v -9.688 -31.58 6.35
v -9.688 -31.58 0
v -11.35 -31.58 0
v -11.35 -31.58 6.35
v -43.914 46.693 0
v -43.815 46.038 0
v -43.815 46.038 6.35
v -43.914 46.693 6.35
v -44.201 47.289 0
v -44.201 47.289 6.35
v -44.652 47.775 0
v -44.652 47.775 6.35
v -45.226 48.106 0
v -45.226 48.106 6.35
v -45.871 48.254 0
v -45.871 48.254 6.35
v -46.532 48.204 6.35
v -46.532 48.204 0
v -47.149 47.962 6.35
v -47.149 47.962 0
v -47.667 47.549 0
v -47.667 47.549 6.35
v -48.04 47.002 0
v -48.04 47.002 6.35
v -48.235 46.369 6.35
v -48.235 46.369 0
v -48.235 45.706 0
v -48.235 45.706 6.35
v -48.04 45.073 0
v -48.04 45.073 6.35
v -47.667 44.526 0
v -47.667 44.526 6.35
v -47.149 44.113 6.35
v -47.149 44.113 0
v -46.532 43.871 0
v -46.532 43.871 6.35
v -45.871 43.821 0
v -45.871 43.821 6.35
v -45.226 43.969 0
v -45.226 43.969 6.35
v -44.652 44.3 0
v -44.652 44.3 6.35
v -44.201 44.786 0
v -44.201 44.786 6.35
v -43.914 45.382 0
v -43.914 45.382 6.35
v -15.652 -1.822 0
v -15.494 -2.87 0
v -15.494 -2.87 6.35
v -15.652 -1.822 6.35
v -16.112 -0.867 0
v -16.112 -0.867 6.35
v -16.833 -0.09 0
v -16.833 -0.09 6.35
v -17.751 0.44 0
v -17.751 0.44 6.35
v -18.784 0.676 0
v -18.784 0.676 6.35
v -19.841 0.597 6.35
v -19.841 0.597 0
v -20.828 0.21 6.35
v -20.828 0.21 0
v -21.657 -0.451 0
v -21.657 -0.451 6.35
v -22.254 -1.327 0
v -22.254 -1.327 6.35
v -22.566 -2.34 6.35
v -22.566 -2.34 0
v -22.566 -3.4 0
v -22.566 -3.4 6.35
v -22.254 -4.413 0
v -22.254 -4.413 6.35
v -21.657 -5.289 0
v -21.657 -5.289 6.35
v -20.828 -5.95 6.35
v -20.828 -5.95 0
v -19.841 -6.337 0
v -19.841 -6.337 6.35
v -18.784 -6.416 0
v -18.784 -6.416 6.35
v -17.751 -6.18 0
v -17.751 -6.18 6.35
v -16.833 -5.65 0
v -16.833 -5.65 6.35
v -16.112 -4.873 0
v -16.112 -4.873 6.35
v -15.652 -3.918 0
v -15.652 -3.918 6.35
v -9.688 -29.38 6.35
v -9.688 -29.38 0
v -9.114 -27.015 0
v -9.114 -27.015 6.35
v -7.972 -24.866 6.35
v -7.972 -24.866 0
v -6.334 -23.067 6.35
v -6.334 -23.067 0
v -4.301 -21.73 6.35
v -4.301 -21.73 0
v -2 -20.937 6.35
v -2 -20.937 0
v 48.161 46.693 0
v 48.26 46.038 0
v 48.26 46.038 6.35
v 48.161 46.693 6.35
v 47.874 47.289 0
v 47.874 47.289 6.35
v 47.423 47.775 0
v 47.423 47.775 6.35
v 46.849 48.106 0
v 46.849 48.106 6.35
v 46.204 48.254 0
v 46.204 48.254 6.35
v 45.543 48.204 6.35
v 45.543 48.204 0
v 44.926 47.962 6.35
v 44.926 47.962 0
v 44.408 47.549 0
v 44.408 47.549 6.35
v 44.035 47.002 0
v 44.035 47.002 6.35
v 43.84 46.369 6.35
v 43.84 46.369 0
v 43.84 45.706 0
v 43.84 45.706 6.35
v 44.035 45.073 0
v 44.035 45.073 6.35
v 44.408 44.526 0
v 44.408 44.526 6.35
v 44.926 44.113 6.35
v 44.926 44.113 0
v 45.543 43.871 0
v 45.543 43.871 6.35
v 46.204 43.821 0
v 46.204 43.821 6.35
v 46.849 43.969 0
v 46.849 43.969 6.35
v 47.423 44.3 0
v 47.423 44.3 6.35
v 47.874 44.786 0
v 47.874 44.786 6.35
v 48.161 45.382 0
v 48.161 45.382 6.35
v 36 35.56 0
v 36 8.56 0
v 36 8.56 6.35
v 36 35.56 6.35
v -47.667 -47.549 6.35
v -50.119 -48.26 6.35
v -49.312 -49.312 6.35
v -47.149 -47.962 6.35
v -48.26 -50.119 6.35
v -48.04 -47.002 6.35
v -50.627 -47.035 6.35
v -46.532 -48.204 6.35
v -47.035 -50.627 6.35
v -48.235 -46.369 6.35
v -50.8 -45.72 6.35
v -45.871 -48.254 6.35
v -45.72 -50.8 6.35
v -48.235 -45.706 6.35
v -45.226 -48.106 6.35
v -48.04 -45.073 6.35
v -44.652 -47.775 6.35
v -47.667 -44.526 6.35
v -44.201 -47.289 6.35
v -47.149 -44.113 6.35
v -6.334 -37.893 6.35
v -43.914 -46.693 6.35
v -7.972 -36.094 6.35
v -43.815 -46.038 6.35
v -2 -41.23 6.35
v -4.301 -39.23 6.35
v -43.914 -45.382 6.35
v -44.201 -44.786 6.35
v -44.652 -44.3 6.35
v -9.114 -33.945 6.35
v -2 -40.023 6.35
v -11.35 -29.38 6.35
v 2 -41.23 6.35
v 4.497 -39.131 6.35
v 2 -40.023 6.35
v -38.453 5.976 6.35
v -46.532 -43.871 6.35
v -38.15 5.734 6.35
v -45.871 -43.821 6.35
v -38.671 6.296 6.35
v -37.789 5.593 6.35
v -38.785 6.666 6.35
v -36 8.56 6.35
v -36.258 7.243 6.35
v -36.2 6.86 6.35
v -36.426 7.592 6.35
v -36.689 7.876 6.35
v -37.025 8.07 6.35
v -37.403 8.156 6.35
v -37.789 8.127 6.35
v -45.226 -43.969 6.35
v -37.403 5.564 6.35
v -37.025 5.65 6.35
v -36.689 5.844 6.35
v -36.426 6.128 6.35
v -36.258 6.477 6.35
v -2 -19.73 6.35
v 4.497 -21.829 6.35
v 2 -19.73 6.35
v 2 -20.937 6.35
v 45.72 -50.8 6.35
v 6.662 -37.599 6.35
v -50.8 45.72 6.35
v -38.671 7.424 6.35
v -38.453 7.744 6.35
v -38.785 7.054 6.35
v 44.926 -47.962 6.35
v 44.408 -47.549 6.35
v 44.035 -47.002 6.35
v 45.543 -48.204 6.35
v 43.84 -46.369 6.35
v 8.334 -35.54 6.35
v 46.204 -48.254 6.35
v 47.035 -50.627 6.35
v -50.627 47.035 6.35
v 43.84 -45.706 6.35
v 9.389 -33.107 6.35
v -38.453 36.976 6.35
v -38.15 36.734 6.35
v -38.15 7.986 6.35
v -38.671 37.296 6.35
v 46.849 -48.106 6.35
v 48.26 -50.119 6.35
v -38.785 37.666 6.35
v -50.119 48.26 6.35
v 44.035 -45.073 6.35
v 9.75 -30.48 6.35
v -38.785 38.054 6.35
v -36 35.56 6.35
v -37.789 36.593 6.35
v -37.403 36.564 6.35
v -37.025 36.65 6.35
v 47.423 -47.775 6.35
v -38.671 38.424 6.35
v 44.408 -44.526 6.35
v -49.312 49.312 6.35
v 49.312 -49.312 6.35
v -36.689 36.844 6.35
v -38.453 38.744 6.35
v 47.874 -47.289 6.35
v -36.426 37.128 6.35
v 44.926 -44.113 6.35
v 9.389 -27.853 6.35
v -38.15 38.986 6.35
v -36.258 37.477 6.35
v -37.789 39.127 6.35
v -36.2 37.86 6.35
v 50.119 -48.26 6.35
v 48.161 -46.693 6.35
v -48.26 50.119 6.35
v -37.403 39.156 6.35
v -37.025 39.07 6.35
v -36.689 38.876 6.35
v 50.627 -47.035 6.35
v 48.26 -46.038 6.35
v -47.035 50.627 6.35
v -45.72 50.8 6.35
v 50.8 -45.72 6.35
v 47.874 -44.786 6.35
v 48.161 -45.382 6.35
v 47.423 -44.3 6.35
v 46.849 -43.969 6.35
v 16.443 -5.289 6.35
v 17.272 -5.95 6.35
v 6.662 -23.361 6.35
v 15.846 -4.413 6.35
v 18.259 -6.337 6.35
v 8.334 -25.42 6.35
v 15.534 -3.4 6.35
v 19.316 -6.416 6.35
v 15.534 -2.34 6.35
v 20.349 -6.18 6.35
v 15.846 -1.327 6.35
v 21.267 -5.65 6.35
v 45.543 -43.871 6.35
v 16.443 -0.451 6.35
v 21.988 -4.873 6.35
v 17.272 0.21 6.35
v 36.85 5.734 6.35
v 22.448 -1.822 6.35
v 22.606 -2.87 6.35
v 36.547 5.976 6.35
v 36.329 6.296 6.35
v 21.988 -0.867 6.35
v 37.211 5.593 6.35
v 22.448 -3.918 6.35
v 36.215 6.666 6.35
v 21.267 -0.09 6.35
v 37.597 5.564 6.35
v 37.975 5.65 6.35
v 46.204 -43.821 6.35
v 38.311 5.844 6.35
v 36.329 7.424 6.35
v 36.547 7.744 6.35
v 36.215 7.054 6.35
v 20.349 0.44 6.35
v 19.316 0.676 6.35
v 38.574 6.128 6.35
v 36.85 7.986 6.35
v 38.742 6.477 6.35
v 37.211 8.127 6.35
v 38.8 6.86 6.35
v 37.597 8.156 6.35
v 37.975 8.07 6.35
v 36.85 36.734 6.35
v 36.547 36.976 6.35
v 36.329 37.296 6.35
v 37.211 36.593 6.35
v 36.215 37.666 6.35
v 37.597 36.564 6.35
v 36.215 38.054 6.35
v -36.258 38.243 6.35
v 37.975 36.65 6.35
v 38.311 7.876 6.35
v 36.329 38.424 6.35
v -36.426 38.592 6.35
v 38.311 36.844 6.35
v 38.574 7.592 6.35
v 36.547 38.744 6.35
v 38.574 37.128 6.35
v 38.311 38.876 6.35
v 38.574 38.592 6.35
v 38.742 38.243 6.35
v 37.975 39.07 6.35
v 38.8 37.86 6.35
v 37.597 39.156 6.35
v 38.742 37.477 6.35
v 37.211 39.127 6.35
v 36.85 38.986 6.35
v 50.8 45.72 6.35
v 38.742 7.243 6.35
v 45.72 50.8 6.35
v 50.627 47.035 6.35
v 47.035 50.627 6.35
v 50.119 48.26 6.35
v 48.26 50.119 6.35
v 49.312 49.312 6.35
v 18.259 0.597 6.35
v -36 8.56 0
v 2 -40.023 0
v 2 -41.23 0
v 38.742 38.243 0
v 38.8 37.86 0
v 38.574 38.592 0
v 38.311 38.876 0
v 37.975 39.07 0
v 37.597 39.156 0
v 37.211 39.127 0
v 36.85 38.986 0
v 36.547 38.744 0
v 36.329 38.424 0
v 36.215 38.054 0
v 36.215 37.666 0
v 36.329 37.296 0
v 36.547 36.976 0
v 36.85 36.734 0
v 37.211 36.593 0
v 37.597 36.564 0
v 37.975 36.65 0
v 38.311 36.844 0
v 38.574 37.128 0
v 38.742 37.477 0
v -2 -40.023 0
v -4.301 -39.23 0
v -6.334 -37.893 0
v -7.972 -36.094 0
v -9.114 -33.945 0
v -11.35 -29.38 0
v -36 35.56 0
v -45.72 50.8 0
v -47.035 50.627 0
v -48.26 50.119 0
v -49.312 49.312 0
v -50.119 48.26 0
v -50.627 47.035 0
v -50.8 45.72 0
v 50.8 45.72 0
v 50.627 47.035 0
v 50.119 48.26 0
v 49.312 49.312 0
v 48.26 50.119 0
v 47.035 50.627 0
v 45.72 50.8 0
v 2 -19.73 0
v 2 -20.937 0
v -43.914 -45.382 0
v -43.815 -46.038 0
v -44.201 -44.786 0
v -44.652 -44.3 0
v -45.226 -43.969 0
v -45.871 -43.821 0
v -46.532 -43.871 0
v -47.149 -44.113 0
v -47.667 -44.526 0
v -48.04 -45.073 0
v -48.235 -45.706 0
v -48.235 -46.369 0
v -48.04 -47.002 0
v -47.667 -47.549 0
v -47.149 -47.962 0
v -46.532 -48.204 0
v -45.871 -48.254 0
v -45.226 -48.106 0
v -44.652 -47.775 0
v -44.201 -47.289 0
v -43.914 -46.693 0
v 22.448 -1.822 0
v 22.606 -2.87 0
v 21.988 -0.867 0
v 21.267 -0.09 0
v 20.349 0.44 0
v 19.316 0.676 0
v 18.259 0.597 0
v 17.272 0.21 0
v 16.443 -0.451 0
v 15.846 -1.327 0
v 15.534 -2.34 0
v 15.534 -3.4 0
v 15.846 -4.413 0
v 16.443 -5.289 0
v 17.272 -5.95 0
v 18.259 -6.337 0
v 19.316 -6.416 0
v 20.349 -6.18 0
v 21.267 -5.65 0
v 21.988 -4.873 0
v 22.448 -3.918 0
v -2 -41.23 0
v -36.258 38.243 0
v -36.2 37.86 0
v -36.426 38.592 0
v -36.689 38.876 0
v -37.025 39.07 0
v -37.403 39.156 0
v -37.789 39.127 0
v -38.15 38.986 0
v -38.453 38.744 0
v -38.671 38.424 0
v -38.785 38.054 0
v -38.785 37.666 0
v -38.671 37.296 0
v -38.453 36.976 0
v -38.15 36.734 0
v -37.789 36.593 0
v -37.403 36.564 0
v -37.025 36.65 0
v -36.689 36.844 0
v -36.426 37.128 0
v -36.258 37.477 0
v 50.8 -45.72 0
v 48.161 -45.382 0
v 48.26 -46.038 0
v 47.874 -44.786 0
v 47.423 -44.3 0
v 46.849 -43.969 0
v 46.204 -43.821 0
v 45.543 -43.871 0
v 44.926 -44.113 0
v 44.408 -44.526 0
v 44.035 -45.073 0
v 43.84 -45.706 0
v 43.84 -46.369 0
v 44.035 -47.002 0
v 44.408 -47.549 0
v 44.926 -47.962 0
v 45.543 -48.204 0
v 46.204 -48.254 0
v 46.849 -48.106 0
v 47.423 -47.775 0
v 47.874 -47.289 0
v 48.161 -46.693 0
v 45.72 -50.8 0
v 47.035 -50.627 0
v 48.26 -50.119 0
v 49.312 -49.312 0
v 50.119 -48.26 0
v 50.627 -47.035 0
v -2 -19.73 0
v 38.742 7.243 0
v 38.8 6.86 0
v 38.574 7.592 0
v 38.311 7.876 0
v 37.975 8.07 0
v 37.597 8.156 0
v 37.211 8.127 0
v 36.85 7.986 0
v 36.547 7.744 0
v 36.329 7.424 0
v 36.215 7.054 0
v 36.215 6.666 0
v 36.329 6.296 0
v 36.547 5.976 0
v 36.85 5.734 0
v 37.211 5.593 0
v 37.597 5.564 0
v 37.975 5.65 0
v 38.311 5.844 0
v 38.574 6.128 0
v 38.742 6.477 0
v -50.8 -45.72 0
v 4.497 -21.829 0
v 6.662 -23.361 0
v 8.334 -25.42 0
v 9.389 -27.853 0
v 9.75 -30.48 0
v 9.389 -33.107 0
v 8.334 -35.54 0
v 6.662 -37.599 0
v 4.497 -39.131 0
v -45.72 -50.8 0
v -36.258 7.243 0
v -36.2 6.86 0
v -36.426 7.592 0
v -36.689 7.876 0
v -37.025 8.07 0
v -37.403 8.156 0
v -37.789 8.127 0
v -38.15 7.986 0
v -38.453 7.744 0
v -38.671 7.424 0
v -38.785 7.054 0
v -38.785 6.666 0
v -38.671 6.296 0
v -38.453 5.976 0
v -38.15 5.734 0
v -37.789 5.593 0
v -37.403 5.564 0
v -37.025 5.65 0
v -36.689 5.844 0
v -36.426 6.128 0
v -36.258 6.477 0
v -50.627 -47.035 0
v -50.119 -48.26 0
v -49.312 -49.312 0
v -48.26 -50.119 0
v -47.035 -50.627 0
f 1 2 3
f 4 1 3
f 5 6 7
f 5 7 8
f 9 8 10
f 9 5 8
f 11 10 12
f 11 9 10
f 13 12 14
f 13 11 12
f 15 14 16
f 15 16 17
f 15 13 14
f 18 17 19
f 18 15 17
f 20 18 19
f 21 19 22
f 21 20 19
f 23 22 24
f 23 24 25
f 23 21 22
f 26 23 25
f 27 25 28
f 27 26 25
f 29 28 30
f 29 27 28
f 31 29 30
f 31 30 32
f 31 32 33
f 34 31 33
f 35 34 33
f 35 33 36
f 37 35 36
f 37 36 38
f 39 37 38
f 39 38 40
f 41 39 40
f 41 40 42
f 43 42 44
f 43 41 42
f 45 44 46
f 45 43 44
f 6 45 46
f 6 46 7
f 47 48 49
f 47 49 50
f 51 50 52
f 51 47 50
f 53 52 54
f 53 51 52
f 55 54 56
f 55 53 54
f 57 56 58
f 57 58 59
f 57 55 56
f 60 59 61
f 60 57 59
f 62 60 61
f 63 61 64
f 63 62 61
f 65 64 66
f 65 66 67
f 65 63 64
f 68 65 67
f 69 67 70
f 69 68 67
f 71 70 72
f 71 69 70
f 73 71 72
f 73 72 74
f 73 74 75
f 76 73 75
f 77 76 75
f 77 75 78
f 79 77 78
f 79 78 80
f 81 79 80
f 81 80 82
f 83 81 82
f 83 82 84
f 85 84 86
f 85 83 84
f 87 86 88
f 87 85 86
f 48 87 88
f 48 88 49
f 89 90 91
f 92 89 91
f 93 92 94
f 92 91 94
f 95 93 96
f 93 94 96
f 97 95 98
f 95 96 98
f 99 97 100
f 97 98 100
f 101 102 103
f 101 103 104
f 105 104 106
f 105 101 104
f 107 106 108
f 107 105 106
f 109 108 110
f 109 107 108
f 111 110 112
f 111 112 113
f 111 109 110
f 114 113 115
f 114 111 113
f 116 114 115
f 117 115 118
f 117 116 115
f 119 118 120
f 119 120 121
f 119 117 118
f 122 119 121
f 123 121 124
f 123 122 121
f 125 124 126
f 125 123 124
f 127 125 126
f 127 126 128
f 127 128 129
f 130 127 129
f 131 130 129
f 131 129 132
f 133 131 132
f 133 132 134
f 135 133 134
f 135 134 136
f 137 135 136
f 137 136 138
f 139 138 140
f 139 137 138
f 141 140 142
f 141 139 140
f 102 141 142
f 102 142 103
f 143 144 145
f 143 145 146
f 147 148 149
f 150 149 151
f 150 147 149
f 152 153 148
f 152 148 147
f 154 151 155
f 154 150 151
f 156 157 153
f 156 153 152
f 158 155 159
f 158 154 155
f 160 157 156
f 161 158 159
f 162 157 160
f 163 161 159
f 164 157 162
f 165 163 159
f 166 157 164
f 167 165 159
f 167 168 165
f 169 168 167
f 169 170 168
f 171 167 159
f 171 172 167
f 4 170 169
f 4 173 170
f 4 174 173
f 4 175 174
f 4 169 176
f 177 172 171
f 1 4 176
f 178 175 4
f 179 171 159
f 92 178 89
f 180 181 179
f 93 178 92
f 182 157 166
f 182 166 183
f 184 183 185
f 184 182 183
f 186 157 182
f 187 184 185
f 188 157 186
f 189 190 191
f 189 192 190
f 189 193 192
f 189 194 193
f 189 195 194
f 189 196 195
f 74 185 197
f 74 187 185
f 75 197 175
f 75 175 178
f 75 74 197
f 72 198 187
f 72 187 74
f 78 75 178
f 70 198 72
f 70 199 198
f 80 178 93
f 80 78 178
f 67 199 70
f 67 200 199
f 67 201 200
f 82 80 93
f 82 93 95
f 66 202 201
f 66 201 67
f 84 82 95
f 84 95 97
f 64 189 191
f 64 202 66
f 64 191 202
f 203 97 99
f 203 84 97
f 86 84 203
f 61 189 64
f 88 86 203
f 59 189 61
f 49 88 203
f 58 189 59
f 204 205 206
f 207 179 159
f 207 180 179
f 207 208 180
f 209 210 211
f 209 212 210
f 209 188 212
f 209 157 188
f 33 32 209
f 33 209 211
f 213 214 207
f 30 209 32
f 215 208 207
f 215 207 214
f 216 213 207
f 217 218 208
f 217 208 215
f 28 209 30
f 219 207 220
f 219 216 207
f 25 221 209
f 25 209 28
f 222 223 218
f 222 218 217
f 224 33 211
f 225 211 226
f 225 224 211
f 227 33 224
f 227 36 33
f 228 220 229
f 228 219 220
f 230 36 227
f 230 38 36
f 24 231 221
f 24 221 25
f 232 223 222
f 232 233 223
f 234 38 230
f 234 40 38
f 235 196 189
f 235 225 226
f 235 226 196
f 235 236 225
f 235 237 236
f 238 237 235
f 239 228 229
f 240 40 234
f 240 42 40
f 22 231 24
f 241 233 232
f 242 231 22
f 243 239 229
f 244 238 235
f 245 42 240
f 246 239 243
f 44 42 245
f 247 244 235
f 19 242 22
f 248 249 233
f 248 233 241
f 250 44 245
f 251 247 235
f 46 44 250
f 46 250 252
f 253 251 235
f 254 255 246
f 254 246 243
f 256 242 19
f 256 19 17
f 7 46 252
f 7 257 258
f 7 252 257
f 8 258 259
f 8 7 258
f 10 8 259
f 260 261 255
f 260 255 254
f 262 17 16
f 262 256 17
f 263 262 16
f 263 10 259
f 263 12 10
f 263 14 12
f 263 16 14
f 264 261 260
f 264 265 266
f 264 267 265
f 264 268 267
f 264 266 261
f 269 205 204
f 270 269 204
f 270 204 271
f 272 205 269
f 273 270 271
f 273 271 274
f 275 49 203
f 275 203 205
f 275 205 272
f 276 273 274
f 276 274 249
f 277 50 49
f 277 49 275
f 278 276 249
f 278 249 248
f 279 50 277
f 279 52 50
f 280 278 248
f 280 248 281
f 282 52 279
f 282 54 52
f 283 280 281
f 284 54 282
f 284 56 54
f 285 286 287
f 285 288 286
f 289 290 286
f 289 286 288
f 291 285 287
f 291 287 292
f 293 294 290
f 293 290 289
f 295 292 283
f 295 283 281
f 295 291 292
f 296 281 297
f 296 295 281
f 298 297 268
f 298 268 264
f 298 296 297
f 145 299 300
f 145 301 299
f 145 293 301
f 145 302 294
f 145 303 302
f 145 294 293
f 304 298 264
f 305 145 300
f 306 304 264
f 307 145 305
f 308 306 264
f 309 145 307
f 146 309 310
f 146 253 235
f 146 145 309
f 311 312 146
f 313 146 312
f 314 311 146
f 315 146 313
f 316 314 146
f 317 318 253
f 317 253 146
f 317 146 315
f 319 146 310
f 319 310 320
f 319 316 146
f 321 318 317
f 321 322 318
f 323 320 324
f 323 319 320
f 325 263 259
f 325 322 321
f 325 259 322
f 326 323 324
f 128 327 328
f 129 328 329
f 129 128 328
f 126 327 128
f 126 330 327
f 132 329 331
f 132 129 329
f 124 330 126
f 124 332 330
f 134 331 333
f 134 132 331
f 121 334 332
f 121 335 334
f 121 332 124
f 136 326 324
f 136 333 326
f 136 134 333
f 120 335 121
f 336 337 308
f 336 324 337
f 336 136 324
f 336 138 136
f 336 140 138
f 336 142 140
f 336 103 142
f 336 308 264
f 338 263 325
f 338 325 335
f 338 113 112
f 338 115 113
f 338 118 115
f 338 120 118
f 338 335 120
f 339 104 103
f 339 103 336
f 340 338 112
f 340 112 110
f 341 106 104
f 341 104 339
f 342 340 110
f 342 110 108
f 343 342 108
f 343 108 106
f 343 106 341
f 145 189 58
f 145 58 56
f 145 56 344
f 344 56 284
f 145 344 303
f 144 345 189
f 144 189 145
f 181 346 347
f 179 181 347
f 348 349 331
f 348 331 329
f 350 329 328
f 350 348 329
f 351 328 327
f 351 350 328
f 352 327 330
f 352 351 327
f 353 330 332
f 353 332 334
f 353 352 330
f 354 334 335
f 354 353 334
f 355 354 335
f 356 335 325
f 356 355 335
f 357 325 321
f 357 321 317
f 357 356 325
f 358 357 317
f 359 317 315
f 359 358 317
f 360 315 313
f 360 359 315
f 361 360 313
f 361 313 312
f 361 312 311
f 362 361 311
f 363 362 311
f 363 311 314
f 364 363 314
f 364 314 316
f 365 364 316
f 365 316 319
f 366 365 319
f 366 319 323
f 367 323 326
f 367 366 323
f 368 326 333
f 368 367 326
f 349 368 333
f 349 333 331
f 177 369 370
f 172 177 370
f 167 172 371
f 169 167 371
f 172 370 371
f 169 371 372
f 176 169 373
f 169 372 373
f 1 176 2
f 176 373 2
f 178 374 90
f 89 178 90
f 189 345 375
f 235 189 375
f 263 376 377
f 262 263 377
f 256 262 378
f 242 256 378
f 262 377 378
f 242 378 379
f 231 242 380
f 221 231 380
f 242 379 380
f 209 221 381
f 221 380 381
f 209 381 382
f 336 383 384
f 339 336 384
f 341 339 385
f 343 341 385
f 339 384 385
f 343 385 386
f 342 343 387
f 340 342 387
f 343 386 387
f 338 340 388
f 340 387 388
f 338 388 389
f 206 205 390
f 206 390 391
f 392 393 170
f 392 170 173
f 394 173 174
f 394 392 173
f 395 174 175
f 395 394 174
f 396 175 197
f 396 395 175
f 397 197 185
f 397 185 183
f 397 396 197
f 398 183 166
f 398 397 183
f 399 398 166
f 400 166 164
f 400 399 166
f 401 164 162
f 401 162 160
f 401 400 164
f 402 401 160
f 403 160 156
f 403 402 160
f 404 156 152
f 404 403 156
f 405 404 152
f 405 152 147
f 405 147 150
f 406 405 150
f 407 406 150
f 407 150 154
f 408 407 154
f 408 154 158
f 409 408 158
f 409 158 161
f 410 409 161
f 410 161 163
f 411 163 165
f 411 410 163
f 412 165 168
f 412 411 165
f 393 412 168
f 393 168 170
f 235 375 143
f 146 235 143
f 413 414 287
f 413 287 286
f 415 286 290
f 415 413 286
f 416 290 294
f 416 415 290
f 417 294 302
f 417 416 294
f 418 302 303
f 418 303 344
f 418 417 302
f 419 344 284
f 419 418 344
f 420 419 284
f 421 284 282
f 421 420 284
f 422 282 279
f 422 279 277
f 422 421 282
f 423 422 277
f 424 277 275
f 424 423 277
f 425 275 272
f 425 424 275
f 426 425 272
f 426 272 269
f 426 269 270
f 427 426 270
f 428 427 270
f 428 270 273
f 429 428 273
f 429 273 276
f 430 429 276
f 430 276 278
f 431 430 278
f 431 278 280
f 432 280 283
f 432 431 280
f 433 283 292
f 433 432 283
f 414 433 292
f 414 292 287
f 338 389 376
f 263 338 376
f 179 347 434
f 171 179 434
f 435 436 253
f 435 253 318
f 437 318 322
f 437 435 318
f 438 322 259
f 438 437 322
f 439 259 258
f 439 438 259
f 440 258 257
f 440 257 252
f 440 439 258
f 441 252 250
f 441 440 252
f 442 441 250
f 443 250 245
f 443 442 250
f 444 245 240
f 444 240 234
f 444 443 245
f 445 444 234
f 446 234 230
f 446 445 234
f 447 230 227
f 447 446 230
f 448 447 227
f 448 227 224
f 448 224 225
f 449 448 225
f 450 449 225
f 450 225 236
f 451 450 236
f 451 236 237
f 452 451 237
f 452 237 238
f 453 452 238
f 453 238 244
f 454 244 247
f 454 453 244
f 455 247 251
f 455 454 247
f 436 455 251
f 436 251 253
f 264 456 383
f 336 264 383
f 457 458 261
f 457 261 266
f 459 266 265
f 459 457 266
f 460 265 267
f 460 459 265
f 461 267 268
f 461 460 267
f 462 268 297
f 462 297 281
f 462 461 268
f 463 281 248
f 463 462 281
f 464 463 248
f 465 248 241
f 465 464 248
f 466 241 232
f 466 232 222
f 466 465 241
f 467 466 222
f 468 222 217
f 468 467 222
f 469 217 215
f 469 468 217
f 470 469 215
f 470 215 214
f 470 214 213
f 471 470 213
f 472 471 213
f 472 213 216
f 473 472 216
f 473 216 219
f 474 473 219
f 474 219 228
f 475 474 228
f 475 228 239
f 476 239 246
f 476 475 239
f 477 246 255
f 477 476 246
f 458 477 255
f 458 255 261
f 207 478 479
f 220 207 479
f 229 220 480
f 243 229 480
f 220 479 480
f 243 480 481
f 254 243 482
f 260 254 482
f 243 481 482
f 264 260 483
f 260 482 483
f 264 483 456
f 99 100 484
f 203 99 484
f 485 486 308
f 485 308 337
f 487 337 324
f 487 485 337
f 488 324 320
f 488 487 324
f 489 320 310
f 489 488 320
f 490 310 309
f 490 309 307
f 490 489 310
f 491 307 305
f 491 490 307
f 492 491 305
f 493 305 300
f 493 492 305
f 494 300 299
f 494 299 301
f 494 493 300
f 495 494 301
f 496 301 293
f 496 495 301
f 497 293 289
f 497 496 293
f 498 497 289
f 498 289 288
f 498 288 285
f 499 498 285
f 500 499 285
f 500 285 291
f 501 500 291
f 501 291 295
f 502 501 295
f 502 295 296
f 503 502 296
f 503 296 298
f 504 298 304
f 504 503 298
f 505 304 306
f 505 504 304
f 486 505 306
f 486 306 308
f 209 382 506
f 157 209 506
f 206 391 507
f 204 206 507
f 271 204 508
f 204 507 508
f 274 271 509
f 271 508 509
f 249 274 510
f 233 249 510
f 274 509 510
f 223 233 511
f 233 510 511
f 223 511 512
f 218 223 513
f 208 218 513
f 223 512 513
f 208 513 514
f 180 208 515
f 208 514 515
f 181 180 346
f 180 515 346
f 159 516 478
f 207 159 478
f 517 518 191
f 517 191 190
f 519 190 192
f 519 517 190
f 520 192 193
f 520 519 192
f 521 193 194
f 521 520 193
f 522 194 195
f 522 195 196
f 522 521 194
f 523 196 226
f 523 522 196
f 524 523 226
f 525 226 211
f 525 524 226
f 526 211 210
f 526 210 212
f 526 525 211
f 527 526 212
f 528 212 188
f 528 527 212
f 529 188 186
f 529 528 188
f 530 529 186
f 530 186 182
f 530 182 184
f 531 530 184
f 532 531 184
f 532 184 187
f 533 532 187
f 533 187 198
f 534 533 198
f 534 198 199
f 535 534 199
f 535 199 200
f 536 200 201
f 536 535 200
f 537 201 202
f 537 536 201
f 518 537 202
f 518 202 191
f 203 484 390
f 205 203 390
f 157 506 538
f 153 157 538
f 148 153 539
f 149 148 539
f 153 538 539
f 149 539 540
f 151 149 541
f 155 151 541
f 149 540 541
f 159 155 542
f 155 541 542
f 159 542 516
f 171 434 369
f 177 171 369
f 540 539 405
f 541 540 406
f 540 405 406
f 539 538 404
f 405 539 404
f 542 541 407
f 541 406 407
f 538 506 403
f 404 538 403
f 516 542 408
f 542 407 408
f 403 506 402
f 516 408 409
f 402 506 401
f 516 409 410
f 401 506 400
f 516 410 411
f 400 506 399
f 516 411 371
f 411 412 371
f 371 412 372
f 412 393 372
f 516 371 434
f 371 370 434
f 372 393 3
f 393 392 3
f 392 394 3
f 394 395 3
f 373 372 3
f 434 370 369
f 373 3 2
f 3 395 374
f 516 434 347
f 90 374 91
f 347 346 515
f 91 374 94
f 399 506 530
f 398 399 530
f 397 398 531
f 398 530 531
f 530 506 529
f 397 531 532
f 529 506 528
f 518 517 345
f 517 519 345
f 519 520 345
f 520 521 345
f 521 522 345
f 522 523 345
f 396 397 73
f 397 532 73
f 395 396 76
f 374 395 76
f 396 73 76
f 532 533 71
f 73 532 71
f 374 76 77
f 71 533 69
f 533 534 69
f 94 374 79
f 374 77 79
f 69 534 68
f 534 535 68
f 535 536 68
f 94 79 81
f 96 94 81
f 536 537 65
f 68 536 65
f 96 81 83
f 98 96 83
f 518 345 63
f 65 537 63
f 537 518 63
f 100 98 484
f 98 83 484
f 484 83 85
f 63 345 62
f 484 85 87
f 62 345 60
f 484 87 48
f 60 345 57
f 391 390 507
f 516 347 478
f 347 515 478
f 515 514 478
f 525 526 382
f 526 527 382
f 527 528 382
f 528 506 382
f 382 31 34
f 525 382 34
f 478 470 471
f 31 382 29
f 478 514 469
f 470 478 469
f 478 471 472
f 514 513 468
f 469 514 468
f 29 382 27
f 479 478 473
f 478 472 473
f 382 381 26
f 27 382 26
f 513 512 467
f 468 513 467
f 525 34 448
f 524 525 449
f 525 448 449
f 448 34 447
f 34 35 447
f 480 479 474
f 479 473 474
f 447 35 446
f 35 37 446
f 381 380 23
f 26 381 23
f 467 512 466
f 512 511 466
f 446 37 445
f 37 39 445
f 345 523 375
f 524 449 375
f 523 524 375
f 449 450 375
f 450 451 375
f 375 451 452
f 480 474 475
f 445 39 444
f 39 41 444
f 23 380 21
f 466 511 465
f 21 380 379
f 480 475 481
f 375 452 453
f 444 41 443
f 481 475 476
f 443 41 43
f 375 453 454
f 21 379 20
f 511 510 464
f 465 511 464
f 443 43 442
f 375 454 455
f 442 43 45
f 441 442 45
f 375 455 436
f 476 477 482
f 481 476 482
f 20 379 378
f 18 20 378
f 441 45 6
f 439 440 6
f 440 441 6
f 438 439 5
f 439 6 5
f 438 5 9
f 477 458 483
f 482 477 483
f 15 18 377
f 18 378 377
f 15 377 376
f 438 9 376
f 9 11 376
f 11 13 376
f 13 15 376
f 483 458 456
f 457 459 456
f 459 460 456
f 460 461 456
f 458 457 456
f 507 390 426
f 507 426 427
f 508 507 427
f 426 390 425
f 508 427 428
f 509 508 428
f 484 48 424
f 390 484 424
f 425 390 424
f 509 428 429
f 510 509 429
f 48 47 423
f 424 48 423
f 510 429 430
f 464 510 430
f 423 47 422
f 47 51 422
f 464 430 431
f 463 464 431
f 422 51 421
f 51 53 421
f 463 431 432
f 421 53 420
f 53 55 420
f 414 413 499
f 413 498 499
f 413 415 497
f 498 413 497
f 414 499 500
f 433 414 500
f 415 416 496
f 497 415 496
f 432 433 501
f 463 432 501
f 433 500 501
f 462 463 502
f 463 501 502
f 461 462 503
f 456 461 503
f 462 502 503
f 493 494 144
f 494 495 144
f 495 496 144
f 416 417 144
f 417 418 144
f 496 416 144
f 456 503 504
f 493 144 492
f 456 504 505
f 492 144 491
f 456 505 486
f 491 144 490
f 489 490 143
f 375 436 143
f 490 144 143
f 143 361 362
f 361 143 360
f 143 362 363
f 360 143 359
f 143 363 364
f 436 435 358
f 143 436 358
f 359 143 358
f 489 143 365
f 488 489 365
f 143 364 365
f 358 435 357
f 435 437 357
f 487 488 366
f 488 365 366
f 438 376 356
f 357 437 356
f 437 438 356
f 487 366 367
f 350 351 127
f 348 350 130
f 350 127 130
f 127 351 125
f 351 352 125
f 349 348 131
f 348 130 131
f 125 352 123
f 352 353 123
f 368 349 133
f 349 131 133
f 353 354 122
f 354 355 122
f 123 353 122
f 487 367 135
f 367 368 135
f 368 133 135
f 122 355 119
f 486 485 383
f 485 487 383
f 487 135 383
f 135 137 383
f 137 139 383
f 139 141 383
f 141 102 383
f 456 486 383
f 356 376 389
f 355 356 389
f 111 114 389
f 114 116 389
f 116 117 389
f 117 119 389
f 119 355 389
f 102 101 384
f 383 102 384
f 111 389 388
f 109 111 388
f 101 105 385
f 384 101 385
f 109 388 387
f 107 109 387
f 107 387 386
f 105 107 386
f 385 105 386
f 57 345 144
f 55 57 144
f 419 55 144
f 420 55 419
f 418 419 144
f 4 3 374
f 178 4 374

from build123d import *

# Parameters (mm, degrees)
F0_R     = 2.2225
F0_R_2   = 3.556
F0_R_3   = 1.3
F0_W     = 72
F0_H     = 27
F1_DEPTH = 6.35


with BuildPart() as f1:
    # F0 (on Top) → F1 (new body)
    with BuildSketch(Plane.XY):
        with BuildLine():
            Line((45.72, 50.8), (-45.72, 50.8))
            ThreePointArc((-45.72, 50.8), (-49.312102, 49.312102), (-50.8, 45.72))
            Line((-50.8, 45.72), (-50.8, -45.72))
            ThreePointArc((-50.8, -45.72), (-49.312102, -49.312102), (-45.72, -50.8))
            Line((-45.72, -50.8), (45.72, -50.8))
            ThreePointArc((45.72, -50.8), (49.312102, -49.312102), (50.8, -45.72))
            Line((50.8, -45.72), (50.8, 45.72))
            ThreePointArc((50.8, 45.72), (49.312102, 49.312102), (45.72, 50.8))
        make_face()
        with Locations((-46.0375, -46.0375)):
            Circle(F0_R, mode=Mode.SUBTRACT)
        with BuildLine():
            ThreePointArc((-2, -40.022667), (-7.209059, -37.044447), (-9.68775, -31.58))
            Line((-9.68775, -31.58), (-11.35, -31.58))
            Line((-11.35, -31.58), (-11.35, -30.48))
            Line((-11.35, -30.48), (-11.35, -29.38))
            Line((-11.35, -29.38), (-9.68775, -29.38))
            ThreePointArc((-9.68775, -29.38), (-7.209059, -23.915553), (-2, -20.937333))
            Line((-2, -20.937333), (-2, -19.73))
            Line((-2, -19.73), (2, -19.73))
            Line((2, -19.73), (2, -20.937333))
            ThreePointArc((2, -20.937333), (9.75, -30.48), (2, -40.022667))
            Line((2, -40.022667), (2, -41.23))
            Line((2, -41.23), (-2, -41.23))
            Line((-2, -41.23), (-2, -40.022667))
        make_face(mode=Mode.SUBTRACT)
        with Locations((-19.05, -2.87)):
            Circle(F0_R_2, mode=Mode.SUBTRACT)
        with Locations((46.0375, -46.0375)):
            Circle(F0_R, mode=Mode.SUBTRACT)
        with Locations((19.05, -2.87)):
            Circle(F0_R_2, mode=Mode.SUBTRACT)
        with Locations((-37.5, 6.86)):
            Circle(F0_R_3, mode=Mode.SUBTRACT)
        with Locations((0, 22.06)):
            Rectangle(F0_W, F0_H, mode=Mode.SUBTRACT)
        with Locations((-37.5, 37.86)):
            Circle(F0_R_3, mode=Mode.SUBTRACT)
        with Locations((-46.0375, 46.0375)):
            Circle(F0_R, mode=Mode.SUBTRACT)
        with Locations((37.5, 6.86)):
            Circle(F0_R_3, mode=Mode.SUBTRACT)
        with Locations((37.5, 37.86)):
            Circle(F0_R_3, mode=Mode.SUBTRACT)
        with Locations((46.0375, 46.0375)):
            Circle(F0_R, mode=Mode.SUBTRACT)
    extrude(amount=F1_DEPTH)


solid = f1.part
